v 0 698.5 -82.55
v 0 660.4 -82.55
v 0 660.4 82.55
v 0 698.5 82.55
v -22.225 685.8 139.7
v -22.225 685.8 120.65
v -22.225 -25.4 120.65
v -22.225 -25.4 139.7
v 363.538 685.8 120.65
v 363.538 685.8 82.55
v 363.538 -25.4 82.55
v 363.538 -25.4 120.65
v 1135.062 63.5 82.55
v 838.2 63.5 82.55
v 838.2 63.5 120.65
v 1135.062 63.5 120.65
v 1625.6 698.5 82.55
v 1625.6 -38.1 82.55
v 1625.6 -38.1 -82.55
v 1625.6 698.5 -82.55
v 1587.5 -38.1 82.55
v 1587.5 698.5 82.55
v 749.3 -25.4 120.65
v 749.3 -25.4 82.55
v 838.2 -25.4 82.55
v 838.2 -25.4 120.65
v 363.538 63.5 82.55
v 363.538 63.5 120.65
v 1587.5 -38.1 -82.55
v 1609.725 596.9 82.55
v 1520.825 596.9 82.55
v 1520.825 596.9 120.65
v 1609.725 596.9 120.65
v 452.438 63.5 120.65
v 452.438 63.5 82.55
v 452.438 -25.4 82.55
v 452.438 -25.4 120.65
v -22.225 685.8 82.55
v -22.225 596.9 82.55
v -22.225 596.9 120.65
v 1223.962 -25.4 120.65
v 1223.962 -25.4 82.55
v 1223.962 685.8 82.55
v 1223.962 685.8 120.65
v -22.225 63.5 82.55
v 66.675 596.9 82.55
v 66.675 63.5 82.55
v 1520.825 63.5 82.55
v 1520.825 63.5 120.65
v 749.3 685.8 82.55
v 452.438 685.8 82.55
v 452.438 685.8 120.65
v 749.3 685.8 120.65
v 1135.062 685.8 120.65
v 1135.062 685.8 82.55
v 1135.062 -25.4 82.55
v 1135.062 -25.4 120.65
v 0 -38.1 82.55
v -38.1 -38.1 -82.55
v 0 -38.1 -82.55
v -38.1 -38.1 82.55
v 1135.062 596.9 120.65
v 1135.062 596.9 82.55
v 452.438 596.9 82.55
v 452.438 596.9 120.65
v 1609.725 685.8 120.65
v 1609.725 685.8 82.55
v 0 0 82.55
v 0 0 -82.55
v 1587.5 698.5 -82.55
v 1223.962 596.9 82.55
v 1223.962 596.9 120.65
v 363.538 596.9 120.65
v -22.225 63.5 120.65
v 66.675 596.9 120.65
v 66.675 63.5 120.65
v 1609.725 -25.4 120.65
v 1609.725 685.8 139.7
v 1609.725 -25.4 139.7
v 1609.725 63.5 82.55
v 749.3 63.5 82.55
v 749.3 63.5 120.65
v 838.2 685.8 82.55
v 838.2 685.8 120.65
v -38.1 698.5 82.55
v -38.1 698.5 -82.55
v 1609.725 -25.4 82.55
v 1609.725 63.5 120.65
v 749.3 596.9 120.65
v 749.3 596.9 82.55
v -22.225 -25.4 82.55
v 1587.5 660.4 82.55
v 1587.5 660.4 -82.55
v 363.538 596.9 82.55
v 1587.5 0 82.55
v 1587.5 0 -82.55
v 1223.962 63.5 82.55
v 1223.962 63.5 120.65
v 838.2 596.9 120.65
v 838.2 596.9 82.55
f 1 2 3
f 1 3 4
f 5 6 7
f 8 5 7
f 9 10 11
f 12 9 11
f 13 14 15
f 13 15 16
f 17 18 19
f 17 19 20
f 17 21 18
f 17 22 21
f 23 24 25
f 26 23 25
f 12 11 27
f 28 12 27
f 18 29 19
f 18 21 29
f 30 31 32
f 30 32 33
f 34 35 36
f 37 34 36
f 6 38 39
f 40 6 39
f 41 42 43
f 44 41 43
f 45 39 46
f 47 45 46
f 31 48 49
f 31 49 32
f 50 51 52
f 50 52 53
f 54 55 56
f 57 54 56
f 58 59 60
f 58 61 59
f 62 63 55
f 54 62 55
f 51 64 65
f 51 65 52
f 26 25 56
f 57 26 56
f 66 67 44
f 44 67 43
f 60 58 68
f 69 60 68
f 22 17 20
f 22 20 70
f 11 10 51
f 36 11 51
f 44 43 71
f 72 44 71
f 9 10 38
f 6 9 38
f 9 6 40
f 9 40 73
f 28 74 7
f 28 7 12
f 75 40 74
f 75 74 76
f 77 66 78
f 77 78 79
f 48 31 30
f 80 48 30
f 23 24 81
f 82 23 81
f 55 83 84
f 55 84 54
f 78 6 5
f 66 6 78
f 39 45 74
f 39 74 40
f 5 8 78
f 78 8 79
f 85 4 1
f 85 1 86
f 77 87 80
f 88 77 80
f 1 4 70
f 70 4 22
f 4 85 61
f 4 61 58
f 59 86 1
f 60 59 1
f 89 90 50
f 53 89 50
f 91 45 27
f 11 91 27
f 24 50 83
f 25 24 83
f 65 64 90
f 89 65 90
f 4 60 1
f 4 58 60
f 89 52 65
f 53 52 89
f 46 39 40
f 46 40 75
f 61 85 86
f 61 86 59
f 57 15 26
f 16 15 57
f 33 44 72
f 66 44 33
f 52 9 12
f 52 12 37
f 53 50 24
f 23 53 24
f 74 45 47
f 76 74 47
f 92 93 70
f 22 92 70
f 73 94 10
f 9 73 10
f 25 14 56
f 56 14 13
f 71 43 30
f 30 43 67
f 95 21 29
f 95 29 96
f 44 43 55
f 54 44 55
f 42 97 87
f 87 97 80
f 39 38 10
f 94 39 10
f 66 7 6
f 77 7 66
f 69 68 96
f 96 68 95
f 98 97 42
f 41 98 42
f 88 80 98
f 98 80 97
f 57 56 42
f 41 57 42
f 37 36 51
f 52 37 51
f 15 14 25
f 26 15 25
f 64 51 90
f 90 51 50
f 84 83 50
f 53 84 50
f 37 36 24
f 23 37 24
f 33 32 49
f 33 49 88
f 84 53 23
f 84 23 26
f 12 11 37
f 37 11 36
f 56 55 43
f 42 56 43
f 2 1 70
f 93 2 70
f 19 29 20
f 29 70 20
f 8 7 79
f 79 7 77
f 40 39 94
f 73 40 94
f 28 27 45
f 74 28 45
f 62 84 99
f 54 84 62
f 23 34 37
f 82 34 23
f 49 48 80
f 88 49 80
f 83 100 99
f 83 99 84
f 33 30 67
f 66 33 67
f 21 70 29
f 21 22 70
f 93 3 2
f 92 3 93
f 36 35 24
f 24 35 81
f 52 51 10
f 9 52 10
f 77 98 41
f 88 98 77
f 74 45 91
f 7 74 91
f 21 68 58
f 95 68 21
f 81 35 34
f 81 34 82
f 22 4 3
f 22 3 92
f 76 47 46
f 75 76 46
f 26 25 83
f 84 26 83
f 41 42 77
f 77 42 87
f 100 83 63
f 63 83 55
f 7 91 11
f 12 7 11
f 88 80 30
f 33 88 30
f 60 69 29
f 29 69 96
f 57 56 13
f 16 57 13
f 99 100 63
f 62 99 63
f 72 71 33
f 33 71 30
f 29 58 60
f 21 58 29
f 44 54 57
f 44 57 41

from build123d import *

# Parameters (mm, degrees)
F1_DEPTH  = 82.55
F0_W      = 1587.5
F0_H      = 38.1
F2_DEPTH  = 82.55
F3_DEPTH  = 82.55
F4_DEPTH  = 82.55
F5_W      = 88.9
F5_H      = 533.4
F6_DEPTH  = 38.1
F5_H_2    = 25.4
F7_DEPTH  = 38.1
F8_DEPTH  = 38.1
F9_DEPTH  = 38.1
F10_DEPTH = 38.1
F11_DEPTH = 38.1
F5_W_2    = 296.8625
F5_H_3    = 88.9
F5_W_3    = 363.5375
F12_DEPTH = 38.1
F5_H_4    = 63.5
F15_W     = 1631.95
F15_H     = 711.2
F16_DEPTH = 19.05


# Not quite as in the source:
# - a feature names something its author has since deleted; it is built from what else it names


with BuildPart() as f1:
    # F0 (on Top) → F1 (new body, symmetric)
    with BuildSketch(Plane.XY):
        Polygon((0, -38.1), (0, 0), (0, 660.4), (0, 698.5), (-38.1, 698.5), (-38.1, -38.1), align=None)
    extrude(amount=F1_DEPTH, both=True)


with BuildPart() as f2:
    # F0 (on Top) → F2 (new body, symmetric)
    with BuildSketch(Plane.XY):
        with Locations((793.75, 679.45)):
            Rectangle(F0_W, F0_H)
    extrude(amount=F2_DEPTH, both=True)


with BuildPart() as f3:
    # F0 (on Top) → F3 (new body, symmetric)
    with BuildSketch(Plane.XY):
        with Locations((793.75, -19.05)):
            Rectangle(F0_W, F0_H)
    extrude(amount=F3_DEPTH, both=True)


with BuildPart() as f4:
    # F0 (on Top) → F4 (new body, symmetric)
    with BuildSketch(Plane.XY):
        Polygon((1587.5, 660.4), (1587.5, 0), (1587.5, -38.1), (1625.6, -38.1), (1625.6, 698.5), (1587.5, 698.5), align=None)
    extrude(amount=F4_DEPTH, both=True)


with BuildPart() as f6:
    # F5 (on face) → F6 (new body)
    with BuildSketch(Plane.XY.offset(82.55)):
        with Locations((22.225, 330.2)):
            Rectangle(F5_W, F5_H)
    extrude(amount=F6_DEPTH)


with BuildPart() as f7:
    # F5 (on face) → F7 (new body)
    with BuildSketch(Plane.XY.offset(82.55)):
        Polygon((363.5375, 596.9), (363.5375, 63.5), (363.5375, 0), (452.4375, 0), (452.4375, 63.5), (452.4375, 596.9), (452.4375, 685.8), (363.5375, 685.8), align=None)
        with Locations((407.9875, -12.7)):
            Rectangle(F5_W, F5_H_2)
    extrude(amount=F7_DEPTH)


with BuildPart() as f8:
    # F5 (on face) → F8 (new body)
    with BuildSketch(Plane.XY.offset(82.55)):
        Polygon((749.3, 63.5), (749.3, 0), (838.2, 0), (838.2, 63.5), (838.2, 596.9), (838.2, 685.8), (749.3, 685.8), (749.3, 596.9), align=None)
        with Locations((793.75, -12.7)):
            Rectangle(F5_W, F5_H_2)
    extrude(amount=F8_DEPTH)


with BuildPart() as f9:
    # F5 (on face) → F9 (new body)
    with BuildSketch(Plane.XY.offset(82.55)):
        Polygon((1135.0625, 0), (1223.9625, 0), (1223.9625, 63.5), (1223.9625, 596.9), (1223.9625, 685.8), (1135.0625, 685.8), (1135.0625, 596.9), (1135.0625, 63.5), align=None)
        with Locations((1179.5125, -12.7)):
            Rectangle(F5_W, F5_H_2)
    extrude(amount=F9_DEPTH)


with BuildPart() as f10:
    # F5 (on face) → F10 (new body)
    with BuildSketch(Plane.XY.offset(82.55)):
        with Locations((1565.275, 330.2)):
            Rectangle(F5_W, F5_H)
    extrude(amount=F10_DEPTH)


with BuildPart() as f11:
    # F5 (on face) → F11 (new body)
    with BuildSketch(Plane.XY.offset(82.55)):
        Polygon((-22.225, 685.8), (-22.225, 596.9), (66.675, 596.9), (363.5375, 596.9), (363.5375, 685.8), align=None)
    extrude(amount=F11_DEPTH)


with BuildPart() as f11b:
    # F5 (on face) → F11, piece 2 (new body)
    with BuildSketch(Plane.XY.offset(82.55)):
        with Locations((600.86875, 641.35)):
            Rectangle(F5_W_2, F5_H_3)
    extrude(amount=F11_DEPTH)


with BuildPart() as f11c:
    # F5 (on face) → F11, piece 3 (new body)
    with BuildSketch(Plane.XY.offset(82.55)):
        with Locations((986.63125, 641.35)):
            Rectangle(F5_W_2, F5_H_3)
    extrude(amount=F11_DEPTH)


with BuildPart() as f11d:
    # F5 (on face) → F11, piece 4 (new body)
    with BuildSketch(Plane.XY.offset(82.55)):
        Polygon((1520.825, 596.9), (1609.725, 596.9), (1609.725, 685.8), (1223.9625, 685.8), (1223.9625, 596.9), align=None)
    extrude(amount=F11_DEPTH)


with BuildPart() as f12:
    # F5 (on face) → F12 (new body)
    with BuildSketch(Plane.XY.offset(82.55)):
        with Locations((181.76875, -12.7)):
            Rectangle(F5_W_3, F5_H_2)
        Polygon((-22.225, 63.5), (-22.225, -25.4), (0, -25.4), (0, 0), (363.5375, 0), (363.5375, 63.5), (66.675, 63.5), align=None)
    extrude(amount=F12_DEPTH)


with BuildPart() as f12b:
    # F5 (on face) → F12, piece 2 (new body)
    with BuildSketch(Plane.XY.offset(82.55)):
        with Locations((600.86875, 31.75)):
            Rectangle(F5_W_2, F5_H_4)
        with Locations((600.86875, -12.7)):
            Rectangle(F5_W_2, F5_H_2)
    extrude(amount=F12_DEPTH)


with BuildPart() as f12c:
    # F5 (on face) → F12, piece 3 (new body)
    with BuildSketch(Plane.XY.offset(82.55)):
        with Locations((986.63125, 31.75)):
            Rectangle(F5_W_2, F5_H_4)
        with Locations((986.63125, -12.7)):
            Rectangle(F5_W_2, F5_H_2)
    extrude(amount=F12_DEPTH)


with BuildPart() as f12d:
    # F5 (on face) → F12, piece 4 (new body)
    with BuildSketch(Plane.XY.offset(82.55)):
        Polygon((1587.5, 0), (1587.5, -25.4), (1609.725, -25.4), (1609.725, 63.5), (1520.825, 63.5), (1223.9625, 63.5), (1223.9625, 0), align=None)
        with Locations((1405.73125, -12.7)):
            Rectangle(F5_W_3, F5_H_2)
    extrude(amount=F12_DEPTH)


with BuildPart() as f16:
    # F15 (on 3pt) → F16 (new body)
    with BuildSketch(Plane(origin=(0, 0, 120.65), x_dir=(1, 0, 0), z_dir=(0, 0, -1))):
        with Locations((793.75, -330.2)):
            Rectangle(F15_W, F15_H)
    extrude(amount=-F16_DEPTH)


solid = Compound([f1.part, f2.part, f3.part, f4.part, f6.part, f7.part, f8.part, f9.part, f10.part, f11.part, f11b.part, f11c.part, f11d.part, f12.part, f12b.part, f12c.part, f12d.part, f16.part])
